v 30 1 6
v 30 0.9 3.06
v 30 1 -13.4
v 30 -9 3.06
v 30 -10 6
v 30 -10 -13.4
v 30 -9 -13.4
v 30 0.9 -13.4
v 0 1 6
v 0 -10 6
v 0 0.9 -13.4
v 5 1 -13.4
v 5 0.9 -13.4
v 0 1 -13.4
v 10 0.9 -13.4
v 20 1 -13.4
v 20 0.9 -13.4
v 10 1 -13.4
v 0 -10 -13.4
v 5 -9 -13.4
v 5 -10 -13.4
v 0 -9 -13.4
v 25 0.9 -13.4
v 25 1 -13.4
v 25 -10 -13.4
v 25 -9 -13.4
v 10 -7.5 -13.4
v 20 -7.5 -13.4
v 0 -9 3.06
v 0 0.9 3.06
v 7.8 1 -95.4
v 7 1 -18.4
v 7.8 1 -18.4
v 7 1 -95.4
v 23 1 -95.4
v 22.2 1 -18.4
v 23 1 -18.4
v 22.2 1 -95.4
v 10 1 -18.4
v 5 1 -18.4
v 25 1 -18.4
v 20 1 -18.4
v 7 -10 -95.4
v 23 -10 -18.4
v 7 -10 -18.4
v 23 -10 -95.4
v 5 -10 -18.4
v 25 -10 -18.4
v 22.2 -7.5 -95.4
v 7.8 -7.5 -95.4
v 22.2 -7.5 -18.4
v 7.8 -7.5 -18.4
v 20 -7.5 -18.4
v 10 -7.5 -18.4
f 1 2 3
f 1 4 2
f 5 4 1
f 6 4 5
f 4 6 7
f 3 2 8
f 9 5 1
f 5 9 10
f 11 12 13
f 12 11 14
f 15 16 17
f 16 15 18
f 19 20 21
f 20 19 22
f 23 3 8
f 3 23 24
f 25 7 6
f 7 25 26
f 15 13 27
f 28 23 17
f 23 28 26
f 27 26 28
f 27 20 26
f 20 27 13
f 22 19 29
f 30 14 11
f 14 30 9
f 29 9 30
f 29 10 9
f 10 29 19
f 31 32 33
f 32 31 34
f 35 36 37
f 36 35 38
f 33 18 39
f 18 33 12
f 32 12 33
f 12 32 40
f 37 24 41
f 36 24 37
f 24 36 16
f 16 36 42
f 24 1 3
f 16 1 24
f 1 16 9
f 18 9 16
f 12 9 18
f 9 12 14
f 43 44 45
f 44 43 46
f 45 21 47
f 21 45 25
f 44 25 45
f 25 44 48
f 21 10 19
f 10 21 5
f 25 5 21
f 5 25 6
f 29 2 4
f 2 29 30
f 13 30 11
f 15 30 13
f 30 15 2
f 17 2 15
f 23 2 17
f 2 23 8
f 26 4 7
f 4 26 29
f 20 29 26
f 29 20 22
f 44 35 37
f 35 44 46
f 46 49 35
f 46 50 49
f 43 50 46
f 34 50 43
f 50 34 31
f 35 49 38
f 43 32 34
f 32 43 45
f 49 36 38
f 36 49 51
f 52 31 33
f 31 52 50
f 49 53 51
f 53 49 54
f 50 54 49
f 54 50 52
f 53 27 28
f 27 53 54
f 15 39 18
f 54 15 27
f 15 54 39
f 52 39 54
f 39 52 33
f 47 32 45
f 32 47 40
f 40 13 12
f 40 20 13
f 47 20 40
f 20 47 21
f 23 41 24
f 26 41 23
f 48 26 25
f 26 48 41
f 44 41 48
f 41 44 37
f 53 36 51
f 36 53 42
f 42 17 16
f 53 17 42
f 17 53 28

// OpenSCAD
    // fitting between mobo bottom plugs

zh = 15 - 2 * 0.3;
midheight = 11;
bottom = -10;
hook = 5;
width = 20 + 2 * hook; // gap of 20 between them, and 5mm on each to hook
midwidth = 10; // actual width of middle *gap* (box is larger, for walls)
midthick = 3;
// other baskets are 88 tall in their entirety; we want to rise just a bit higher up
midtall = 88 - midheight + 5;

module bottom(){
  cube([width, midheight, 20 - 2 * 0.3]);
}

difference(){
  translate([0, bottom, -(zh - 1)]){
    bottom();
  }
  translate([0, bottom + 1, -zh]){
    scale([1, 0.9, 0.9]){
      bottom();
    }
  }
}

hookheight = 5;
coverwidth = (width - hook * 2 - midwidth) / 2;

// left half of bottom top
translate([hook, bottom, -zh - hookheight + 1]){
  cube([coverwidth, midheight, hookheight]);
}
// right half of bottom top
translate([width - (coverwidth + hook), bottom, -zh - hookheight + 1]){
  cube([coverwidth, midheight, hookheight]);
}
// middle box
module midbox(){
  translate([(width - (midwidth + midthick * 2)) / 2, bottom, -zh + 1 - midtall]){
    cube([midwidth + midthick * 2, midheight, midtall]);
  }
}

// hollow middle box with missing back
difference(){
  midbox();
  translate([midthick / 2, midthick / 2, 0]){
    scale([0.9, 0.9, 1]){
      midbox();
    }
  }
}
